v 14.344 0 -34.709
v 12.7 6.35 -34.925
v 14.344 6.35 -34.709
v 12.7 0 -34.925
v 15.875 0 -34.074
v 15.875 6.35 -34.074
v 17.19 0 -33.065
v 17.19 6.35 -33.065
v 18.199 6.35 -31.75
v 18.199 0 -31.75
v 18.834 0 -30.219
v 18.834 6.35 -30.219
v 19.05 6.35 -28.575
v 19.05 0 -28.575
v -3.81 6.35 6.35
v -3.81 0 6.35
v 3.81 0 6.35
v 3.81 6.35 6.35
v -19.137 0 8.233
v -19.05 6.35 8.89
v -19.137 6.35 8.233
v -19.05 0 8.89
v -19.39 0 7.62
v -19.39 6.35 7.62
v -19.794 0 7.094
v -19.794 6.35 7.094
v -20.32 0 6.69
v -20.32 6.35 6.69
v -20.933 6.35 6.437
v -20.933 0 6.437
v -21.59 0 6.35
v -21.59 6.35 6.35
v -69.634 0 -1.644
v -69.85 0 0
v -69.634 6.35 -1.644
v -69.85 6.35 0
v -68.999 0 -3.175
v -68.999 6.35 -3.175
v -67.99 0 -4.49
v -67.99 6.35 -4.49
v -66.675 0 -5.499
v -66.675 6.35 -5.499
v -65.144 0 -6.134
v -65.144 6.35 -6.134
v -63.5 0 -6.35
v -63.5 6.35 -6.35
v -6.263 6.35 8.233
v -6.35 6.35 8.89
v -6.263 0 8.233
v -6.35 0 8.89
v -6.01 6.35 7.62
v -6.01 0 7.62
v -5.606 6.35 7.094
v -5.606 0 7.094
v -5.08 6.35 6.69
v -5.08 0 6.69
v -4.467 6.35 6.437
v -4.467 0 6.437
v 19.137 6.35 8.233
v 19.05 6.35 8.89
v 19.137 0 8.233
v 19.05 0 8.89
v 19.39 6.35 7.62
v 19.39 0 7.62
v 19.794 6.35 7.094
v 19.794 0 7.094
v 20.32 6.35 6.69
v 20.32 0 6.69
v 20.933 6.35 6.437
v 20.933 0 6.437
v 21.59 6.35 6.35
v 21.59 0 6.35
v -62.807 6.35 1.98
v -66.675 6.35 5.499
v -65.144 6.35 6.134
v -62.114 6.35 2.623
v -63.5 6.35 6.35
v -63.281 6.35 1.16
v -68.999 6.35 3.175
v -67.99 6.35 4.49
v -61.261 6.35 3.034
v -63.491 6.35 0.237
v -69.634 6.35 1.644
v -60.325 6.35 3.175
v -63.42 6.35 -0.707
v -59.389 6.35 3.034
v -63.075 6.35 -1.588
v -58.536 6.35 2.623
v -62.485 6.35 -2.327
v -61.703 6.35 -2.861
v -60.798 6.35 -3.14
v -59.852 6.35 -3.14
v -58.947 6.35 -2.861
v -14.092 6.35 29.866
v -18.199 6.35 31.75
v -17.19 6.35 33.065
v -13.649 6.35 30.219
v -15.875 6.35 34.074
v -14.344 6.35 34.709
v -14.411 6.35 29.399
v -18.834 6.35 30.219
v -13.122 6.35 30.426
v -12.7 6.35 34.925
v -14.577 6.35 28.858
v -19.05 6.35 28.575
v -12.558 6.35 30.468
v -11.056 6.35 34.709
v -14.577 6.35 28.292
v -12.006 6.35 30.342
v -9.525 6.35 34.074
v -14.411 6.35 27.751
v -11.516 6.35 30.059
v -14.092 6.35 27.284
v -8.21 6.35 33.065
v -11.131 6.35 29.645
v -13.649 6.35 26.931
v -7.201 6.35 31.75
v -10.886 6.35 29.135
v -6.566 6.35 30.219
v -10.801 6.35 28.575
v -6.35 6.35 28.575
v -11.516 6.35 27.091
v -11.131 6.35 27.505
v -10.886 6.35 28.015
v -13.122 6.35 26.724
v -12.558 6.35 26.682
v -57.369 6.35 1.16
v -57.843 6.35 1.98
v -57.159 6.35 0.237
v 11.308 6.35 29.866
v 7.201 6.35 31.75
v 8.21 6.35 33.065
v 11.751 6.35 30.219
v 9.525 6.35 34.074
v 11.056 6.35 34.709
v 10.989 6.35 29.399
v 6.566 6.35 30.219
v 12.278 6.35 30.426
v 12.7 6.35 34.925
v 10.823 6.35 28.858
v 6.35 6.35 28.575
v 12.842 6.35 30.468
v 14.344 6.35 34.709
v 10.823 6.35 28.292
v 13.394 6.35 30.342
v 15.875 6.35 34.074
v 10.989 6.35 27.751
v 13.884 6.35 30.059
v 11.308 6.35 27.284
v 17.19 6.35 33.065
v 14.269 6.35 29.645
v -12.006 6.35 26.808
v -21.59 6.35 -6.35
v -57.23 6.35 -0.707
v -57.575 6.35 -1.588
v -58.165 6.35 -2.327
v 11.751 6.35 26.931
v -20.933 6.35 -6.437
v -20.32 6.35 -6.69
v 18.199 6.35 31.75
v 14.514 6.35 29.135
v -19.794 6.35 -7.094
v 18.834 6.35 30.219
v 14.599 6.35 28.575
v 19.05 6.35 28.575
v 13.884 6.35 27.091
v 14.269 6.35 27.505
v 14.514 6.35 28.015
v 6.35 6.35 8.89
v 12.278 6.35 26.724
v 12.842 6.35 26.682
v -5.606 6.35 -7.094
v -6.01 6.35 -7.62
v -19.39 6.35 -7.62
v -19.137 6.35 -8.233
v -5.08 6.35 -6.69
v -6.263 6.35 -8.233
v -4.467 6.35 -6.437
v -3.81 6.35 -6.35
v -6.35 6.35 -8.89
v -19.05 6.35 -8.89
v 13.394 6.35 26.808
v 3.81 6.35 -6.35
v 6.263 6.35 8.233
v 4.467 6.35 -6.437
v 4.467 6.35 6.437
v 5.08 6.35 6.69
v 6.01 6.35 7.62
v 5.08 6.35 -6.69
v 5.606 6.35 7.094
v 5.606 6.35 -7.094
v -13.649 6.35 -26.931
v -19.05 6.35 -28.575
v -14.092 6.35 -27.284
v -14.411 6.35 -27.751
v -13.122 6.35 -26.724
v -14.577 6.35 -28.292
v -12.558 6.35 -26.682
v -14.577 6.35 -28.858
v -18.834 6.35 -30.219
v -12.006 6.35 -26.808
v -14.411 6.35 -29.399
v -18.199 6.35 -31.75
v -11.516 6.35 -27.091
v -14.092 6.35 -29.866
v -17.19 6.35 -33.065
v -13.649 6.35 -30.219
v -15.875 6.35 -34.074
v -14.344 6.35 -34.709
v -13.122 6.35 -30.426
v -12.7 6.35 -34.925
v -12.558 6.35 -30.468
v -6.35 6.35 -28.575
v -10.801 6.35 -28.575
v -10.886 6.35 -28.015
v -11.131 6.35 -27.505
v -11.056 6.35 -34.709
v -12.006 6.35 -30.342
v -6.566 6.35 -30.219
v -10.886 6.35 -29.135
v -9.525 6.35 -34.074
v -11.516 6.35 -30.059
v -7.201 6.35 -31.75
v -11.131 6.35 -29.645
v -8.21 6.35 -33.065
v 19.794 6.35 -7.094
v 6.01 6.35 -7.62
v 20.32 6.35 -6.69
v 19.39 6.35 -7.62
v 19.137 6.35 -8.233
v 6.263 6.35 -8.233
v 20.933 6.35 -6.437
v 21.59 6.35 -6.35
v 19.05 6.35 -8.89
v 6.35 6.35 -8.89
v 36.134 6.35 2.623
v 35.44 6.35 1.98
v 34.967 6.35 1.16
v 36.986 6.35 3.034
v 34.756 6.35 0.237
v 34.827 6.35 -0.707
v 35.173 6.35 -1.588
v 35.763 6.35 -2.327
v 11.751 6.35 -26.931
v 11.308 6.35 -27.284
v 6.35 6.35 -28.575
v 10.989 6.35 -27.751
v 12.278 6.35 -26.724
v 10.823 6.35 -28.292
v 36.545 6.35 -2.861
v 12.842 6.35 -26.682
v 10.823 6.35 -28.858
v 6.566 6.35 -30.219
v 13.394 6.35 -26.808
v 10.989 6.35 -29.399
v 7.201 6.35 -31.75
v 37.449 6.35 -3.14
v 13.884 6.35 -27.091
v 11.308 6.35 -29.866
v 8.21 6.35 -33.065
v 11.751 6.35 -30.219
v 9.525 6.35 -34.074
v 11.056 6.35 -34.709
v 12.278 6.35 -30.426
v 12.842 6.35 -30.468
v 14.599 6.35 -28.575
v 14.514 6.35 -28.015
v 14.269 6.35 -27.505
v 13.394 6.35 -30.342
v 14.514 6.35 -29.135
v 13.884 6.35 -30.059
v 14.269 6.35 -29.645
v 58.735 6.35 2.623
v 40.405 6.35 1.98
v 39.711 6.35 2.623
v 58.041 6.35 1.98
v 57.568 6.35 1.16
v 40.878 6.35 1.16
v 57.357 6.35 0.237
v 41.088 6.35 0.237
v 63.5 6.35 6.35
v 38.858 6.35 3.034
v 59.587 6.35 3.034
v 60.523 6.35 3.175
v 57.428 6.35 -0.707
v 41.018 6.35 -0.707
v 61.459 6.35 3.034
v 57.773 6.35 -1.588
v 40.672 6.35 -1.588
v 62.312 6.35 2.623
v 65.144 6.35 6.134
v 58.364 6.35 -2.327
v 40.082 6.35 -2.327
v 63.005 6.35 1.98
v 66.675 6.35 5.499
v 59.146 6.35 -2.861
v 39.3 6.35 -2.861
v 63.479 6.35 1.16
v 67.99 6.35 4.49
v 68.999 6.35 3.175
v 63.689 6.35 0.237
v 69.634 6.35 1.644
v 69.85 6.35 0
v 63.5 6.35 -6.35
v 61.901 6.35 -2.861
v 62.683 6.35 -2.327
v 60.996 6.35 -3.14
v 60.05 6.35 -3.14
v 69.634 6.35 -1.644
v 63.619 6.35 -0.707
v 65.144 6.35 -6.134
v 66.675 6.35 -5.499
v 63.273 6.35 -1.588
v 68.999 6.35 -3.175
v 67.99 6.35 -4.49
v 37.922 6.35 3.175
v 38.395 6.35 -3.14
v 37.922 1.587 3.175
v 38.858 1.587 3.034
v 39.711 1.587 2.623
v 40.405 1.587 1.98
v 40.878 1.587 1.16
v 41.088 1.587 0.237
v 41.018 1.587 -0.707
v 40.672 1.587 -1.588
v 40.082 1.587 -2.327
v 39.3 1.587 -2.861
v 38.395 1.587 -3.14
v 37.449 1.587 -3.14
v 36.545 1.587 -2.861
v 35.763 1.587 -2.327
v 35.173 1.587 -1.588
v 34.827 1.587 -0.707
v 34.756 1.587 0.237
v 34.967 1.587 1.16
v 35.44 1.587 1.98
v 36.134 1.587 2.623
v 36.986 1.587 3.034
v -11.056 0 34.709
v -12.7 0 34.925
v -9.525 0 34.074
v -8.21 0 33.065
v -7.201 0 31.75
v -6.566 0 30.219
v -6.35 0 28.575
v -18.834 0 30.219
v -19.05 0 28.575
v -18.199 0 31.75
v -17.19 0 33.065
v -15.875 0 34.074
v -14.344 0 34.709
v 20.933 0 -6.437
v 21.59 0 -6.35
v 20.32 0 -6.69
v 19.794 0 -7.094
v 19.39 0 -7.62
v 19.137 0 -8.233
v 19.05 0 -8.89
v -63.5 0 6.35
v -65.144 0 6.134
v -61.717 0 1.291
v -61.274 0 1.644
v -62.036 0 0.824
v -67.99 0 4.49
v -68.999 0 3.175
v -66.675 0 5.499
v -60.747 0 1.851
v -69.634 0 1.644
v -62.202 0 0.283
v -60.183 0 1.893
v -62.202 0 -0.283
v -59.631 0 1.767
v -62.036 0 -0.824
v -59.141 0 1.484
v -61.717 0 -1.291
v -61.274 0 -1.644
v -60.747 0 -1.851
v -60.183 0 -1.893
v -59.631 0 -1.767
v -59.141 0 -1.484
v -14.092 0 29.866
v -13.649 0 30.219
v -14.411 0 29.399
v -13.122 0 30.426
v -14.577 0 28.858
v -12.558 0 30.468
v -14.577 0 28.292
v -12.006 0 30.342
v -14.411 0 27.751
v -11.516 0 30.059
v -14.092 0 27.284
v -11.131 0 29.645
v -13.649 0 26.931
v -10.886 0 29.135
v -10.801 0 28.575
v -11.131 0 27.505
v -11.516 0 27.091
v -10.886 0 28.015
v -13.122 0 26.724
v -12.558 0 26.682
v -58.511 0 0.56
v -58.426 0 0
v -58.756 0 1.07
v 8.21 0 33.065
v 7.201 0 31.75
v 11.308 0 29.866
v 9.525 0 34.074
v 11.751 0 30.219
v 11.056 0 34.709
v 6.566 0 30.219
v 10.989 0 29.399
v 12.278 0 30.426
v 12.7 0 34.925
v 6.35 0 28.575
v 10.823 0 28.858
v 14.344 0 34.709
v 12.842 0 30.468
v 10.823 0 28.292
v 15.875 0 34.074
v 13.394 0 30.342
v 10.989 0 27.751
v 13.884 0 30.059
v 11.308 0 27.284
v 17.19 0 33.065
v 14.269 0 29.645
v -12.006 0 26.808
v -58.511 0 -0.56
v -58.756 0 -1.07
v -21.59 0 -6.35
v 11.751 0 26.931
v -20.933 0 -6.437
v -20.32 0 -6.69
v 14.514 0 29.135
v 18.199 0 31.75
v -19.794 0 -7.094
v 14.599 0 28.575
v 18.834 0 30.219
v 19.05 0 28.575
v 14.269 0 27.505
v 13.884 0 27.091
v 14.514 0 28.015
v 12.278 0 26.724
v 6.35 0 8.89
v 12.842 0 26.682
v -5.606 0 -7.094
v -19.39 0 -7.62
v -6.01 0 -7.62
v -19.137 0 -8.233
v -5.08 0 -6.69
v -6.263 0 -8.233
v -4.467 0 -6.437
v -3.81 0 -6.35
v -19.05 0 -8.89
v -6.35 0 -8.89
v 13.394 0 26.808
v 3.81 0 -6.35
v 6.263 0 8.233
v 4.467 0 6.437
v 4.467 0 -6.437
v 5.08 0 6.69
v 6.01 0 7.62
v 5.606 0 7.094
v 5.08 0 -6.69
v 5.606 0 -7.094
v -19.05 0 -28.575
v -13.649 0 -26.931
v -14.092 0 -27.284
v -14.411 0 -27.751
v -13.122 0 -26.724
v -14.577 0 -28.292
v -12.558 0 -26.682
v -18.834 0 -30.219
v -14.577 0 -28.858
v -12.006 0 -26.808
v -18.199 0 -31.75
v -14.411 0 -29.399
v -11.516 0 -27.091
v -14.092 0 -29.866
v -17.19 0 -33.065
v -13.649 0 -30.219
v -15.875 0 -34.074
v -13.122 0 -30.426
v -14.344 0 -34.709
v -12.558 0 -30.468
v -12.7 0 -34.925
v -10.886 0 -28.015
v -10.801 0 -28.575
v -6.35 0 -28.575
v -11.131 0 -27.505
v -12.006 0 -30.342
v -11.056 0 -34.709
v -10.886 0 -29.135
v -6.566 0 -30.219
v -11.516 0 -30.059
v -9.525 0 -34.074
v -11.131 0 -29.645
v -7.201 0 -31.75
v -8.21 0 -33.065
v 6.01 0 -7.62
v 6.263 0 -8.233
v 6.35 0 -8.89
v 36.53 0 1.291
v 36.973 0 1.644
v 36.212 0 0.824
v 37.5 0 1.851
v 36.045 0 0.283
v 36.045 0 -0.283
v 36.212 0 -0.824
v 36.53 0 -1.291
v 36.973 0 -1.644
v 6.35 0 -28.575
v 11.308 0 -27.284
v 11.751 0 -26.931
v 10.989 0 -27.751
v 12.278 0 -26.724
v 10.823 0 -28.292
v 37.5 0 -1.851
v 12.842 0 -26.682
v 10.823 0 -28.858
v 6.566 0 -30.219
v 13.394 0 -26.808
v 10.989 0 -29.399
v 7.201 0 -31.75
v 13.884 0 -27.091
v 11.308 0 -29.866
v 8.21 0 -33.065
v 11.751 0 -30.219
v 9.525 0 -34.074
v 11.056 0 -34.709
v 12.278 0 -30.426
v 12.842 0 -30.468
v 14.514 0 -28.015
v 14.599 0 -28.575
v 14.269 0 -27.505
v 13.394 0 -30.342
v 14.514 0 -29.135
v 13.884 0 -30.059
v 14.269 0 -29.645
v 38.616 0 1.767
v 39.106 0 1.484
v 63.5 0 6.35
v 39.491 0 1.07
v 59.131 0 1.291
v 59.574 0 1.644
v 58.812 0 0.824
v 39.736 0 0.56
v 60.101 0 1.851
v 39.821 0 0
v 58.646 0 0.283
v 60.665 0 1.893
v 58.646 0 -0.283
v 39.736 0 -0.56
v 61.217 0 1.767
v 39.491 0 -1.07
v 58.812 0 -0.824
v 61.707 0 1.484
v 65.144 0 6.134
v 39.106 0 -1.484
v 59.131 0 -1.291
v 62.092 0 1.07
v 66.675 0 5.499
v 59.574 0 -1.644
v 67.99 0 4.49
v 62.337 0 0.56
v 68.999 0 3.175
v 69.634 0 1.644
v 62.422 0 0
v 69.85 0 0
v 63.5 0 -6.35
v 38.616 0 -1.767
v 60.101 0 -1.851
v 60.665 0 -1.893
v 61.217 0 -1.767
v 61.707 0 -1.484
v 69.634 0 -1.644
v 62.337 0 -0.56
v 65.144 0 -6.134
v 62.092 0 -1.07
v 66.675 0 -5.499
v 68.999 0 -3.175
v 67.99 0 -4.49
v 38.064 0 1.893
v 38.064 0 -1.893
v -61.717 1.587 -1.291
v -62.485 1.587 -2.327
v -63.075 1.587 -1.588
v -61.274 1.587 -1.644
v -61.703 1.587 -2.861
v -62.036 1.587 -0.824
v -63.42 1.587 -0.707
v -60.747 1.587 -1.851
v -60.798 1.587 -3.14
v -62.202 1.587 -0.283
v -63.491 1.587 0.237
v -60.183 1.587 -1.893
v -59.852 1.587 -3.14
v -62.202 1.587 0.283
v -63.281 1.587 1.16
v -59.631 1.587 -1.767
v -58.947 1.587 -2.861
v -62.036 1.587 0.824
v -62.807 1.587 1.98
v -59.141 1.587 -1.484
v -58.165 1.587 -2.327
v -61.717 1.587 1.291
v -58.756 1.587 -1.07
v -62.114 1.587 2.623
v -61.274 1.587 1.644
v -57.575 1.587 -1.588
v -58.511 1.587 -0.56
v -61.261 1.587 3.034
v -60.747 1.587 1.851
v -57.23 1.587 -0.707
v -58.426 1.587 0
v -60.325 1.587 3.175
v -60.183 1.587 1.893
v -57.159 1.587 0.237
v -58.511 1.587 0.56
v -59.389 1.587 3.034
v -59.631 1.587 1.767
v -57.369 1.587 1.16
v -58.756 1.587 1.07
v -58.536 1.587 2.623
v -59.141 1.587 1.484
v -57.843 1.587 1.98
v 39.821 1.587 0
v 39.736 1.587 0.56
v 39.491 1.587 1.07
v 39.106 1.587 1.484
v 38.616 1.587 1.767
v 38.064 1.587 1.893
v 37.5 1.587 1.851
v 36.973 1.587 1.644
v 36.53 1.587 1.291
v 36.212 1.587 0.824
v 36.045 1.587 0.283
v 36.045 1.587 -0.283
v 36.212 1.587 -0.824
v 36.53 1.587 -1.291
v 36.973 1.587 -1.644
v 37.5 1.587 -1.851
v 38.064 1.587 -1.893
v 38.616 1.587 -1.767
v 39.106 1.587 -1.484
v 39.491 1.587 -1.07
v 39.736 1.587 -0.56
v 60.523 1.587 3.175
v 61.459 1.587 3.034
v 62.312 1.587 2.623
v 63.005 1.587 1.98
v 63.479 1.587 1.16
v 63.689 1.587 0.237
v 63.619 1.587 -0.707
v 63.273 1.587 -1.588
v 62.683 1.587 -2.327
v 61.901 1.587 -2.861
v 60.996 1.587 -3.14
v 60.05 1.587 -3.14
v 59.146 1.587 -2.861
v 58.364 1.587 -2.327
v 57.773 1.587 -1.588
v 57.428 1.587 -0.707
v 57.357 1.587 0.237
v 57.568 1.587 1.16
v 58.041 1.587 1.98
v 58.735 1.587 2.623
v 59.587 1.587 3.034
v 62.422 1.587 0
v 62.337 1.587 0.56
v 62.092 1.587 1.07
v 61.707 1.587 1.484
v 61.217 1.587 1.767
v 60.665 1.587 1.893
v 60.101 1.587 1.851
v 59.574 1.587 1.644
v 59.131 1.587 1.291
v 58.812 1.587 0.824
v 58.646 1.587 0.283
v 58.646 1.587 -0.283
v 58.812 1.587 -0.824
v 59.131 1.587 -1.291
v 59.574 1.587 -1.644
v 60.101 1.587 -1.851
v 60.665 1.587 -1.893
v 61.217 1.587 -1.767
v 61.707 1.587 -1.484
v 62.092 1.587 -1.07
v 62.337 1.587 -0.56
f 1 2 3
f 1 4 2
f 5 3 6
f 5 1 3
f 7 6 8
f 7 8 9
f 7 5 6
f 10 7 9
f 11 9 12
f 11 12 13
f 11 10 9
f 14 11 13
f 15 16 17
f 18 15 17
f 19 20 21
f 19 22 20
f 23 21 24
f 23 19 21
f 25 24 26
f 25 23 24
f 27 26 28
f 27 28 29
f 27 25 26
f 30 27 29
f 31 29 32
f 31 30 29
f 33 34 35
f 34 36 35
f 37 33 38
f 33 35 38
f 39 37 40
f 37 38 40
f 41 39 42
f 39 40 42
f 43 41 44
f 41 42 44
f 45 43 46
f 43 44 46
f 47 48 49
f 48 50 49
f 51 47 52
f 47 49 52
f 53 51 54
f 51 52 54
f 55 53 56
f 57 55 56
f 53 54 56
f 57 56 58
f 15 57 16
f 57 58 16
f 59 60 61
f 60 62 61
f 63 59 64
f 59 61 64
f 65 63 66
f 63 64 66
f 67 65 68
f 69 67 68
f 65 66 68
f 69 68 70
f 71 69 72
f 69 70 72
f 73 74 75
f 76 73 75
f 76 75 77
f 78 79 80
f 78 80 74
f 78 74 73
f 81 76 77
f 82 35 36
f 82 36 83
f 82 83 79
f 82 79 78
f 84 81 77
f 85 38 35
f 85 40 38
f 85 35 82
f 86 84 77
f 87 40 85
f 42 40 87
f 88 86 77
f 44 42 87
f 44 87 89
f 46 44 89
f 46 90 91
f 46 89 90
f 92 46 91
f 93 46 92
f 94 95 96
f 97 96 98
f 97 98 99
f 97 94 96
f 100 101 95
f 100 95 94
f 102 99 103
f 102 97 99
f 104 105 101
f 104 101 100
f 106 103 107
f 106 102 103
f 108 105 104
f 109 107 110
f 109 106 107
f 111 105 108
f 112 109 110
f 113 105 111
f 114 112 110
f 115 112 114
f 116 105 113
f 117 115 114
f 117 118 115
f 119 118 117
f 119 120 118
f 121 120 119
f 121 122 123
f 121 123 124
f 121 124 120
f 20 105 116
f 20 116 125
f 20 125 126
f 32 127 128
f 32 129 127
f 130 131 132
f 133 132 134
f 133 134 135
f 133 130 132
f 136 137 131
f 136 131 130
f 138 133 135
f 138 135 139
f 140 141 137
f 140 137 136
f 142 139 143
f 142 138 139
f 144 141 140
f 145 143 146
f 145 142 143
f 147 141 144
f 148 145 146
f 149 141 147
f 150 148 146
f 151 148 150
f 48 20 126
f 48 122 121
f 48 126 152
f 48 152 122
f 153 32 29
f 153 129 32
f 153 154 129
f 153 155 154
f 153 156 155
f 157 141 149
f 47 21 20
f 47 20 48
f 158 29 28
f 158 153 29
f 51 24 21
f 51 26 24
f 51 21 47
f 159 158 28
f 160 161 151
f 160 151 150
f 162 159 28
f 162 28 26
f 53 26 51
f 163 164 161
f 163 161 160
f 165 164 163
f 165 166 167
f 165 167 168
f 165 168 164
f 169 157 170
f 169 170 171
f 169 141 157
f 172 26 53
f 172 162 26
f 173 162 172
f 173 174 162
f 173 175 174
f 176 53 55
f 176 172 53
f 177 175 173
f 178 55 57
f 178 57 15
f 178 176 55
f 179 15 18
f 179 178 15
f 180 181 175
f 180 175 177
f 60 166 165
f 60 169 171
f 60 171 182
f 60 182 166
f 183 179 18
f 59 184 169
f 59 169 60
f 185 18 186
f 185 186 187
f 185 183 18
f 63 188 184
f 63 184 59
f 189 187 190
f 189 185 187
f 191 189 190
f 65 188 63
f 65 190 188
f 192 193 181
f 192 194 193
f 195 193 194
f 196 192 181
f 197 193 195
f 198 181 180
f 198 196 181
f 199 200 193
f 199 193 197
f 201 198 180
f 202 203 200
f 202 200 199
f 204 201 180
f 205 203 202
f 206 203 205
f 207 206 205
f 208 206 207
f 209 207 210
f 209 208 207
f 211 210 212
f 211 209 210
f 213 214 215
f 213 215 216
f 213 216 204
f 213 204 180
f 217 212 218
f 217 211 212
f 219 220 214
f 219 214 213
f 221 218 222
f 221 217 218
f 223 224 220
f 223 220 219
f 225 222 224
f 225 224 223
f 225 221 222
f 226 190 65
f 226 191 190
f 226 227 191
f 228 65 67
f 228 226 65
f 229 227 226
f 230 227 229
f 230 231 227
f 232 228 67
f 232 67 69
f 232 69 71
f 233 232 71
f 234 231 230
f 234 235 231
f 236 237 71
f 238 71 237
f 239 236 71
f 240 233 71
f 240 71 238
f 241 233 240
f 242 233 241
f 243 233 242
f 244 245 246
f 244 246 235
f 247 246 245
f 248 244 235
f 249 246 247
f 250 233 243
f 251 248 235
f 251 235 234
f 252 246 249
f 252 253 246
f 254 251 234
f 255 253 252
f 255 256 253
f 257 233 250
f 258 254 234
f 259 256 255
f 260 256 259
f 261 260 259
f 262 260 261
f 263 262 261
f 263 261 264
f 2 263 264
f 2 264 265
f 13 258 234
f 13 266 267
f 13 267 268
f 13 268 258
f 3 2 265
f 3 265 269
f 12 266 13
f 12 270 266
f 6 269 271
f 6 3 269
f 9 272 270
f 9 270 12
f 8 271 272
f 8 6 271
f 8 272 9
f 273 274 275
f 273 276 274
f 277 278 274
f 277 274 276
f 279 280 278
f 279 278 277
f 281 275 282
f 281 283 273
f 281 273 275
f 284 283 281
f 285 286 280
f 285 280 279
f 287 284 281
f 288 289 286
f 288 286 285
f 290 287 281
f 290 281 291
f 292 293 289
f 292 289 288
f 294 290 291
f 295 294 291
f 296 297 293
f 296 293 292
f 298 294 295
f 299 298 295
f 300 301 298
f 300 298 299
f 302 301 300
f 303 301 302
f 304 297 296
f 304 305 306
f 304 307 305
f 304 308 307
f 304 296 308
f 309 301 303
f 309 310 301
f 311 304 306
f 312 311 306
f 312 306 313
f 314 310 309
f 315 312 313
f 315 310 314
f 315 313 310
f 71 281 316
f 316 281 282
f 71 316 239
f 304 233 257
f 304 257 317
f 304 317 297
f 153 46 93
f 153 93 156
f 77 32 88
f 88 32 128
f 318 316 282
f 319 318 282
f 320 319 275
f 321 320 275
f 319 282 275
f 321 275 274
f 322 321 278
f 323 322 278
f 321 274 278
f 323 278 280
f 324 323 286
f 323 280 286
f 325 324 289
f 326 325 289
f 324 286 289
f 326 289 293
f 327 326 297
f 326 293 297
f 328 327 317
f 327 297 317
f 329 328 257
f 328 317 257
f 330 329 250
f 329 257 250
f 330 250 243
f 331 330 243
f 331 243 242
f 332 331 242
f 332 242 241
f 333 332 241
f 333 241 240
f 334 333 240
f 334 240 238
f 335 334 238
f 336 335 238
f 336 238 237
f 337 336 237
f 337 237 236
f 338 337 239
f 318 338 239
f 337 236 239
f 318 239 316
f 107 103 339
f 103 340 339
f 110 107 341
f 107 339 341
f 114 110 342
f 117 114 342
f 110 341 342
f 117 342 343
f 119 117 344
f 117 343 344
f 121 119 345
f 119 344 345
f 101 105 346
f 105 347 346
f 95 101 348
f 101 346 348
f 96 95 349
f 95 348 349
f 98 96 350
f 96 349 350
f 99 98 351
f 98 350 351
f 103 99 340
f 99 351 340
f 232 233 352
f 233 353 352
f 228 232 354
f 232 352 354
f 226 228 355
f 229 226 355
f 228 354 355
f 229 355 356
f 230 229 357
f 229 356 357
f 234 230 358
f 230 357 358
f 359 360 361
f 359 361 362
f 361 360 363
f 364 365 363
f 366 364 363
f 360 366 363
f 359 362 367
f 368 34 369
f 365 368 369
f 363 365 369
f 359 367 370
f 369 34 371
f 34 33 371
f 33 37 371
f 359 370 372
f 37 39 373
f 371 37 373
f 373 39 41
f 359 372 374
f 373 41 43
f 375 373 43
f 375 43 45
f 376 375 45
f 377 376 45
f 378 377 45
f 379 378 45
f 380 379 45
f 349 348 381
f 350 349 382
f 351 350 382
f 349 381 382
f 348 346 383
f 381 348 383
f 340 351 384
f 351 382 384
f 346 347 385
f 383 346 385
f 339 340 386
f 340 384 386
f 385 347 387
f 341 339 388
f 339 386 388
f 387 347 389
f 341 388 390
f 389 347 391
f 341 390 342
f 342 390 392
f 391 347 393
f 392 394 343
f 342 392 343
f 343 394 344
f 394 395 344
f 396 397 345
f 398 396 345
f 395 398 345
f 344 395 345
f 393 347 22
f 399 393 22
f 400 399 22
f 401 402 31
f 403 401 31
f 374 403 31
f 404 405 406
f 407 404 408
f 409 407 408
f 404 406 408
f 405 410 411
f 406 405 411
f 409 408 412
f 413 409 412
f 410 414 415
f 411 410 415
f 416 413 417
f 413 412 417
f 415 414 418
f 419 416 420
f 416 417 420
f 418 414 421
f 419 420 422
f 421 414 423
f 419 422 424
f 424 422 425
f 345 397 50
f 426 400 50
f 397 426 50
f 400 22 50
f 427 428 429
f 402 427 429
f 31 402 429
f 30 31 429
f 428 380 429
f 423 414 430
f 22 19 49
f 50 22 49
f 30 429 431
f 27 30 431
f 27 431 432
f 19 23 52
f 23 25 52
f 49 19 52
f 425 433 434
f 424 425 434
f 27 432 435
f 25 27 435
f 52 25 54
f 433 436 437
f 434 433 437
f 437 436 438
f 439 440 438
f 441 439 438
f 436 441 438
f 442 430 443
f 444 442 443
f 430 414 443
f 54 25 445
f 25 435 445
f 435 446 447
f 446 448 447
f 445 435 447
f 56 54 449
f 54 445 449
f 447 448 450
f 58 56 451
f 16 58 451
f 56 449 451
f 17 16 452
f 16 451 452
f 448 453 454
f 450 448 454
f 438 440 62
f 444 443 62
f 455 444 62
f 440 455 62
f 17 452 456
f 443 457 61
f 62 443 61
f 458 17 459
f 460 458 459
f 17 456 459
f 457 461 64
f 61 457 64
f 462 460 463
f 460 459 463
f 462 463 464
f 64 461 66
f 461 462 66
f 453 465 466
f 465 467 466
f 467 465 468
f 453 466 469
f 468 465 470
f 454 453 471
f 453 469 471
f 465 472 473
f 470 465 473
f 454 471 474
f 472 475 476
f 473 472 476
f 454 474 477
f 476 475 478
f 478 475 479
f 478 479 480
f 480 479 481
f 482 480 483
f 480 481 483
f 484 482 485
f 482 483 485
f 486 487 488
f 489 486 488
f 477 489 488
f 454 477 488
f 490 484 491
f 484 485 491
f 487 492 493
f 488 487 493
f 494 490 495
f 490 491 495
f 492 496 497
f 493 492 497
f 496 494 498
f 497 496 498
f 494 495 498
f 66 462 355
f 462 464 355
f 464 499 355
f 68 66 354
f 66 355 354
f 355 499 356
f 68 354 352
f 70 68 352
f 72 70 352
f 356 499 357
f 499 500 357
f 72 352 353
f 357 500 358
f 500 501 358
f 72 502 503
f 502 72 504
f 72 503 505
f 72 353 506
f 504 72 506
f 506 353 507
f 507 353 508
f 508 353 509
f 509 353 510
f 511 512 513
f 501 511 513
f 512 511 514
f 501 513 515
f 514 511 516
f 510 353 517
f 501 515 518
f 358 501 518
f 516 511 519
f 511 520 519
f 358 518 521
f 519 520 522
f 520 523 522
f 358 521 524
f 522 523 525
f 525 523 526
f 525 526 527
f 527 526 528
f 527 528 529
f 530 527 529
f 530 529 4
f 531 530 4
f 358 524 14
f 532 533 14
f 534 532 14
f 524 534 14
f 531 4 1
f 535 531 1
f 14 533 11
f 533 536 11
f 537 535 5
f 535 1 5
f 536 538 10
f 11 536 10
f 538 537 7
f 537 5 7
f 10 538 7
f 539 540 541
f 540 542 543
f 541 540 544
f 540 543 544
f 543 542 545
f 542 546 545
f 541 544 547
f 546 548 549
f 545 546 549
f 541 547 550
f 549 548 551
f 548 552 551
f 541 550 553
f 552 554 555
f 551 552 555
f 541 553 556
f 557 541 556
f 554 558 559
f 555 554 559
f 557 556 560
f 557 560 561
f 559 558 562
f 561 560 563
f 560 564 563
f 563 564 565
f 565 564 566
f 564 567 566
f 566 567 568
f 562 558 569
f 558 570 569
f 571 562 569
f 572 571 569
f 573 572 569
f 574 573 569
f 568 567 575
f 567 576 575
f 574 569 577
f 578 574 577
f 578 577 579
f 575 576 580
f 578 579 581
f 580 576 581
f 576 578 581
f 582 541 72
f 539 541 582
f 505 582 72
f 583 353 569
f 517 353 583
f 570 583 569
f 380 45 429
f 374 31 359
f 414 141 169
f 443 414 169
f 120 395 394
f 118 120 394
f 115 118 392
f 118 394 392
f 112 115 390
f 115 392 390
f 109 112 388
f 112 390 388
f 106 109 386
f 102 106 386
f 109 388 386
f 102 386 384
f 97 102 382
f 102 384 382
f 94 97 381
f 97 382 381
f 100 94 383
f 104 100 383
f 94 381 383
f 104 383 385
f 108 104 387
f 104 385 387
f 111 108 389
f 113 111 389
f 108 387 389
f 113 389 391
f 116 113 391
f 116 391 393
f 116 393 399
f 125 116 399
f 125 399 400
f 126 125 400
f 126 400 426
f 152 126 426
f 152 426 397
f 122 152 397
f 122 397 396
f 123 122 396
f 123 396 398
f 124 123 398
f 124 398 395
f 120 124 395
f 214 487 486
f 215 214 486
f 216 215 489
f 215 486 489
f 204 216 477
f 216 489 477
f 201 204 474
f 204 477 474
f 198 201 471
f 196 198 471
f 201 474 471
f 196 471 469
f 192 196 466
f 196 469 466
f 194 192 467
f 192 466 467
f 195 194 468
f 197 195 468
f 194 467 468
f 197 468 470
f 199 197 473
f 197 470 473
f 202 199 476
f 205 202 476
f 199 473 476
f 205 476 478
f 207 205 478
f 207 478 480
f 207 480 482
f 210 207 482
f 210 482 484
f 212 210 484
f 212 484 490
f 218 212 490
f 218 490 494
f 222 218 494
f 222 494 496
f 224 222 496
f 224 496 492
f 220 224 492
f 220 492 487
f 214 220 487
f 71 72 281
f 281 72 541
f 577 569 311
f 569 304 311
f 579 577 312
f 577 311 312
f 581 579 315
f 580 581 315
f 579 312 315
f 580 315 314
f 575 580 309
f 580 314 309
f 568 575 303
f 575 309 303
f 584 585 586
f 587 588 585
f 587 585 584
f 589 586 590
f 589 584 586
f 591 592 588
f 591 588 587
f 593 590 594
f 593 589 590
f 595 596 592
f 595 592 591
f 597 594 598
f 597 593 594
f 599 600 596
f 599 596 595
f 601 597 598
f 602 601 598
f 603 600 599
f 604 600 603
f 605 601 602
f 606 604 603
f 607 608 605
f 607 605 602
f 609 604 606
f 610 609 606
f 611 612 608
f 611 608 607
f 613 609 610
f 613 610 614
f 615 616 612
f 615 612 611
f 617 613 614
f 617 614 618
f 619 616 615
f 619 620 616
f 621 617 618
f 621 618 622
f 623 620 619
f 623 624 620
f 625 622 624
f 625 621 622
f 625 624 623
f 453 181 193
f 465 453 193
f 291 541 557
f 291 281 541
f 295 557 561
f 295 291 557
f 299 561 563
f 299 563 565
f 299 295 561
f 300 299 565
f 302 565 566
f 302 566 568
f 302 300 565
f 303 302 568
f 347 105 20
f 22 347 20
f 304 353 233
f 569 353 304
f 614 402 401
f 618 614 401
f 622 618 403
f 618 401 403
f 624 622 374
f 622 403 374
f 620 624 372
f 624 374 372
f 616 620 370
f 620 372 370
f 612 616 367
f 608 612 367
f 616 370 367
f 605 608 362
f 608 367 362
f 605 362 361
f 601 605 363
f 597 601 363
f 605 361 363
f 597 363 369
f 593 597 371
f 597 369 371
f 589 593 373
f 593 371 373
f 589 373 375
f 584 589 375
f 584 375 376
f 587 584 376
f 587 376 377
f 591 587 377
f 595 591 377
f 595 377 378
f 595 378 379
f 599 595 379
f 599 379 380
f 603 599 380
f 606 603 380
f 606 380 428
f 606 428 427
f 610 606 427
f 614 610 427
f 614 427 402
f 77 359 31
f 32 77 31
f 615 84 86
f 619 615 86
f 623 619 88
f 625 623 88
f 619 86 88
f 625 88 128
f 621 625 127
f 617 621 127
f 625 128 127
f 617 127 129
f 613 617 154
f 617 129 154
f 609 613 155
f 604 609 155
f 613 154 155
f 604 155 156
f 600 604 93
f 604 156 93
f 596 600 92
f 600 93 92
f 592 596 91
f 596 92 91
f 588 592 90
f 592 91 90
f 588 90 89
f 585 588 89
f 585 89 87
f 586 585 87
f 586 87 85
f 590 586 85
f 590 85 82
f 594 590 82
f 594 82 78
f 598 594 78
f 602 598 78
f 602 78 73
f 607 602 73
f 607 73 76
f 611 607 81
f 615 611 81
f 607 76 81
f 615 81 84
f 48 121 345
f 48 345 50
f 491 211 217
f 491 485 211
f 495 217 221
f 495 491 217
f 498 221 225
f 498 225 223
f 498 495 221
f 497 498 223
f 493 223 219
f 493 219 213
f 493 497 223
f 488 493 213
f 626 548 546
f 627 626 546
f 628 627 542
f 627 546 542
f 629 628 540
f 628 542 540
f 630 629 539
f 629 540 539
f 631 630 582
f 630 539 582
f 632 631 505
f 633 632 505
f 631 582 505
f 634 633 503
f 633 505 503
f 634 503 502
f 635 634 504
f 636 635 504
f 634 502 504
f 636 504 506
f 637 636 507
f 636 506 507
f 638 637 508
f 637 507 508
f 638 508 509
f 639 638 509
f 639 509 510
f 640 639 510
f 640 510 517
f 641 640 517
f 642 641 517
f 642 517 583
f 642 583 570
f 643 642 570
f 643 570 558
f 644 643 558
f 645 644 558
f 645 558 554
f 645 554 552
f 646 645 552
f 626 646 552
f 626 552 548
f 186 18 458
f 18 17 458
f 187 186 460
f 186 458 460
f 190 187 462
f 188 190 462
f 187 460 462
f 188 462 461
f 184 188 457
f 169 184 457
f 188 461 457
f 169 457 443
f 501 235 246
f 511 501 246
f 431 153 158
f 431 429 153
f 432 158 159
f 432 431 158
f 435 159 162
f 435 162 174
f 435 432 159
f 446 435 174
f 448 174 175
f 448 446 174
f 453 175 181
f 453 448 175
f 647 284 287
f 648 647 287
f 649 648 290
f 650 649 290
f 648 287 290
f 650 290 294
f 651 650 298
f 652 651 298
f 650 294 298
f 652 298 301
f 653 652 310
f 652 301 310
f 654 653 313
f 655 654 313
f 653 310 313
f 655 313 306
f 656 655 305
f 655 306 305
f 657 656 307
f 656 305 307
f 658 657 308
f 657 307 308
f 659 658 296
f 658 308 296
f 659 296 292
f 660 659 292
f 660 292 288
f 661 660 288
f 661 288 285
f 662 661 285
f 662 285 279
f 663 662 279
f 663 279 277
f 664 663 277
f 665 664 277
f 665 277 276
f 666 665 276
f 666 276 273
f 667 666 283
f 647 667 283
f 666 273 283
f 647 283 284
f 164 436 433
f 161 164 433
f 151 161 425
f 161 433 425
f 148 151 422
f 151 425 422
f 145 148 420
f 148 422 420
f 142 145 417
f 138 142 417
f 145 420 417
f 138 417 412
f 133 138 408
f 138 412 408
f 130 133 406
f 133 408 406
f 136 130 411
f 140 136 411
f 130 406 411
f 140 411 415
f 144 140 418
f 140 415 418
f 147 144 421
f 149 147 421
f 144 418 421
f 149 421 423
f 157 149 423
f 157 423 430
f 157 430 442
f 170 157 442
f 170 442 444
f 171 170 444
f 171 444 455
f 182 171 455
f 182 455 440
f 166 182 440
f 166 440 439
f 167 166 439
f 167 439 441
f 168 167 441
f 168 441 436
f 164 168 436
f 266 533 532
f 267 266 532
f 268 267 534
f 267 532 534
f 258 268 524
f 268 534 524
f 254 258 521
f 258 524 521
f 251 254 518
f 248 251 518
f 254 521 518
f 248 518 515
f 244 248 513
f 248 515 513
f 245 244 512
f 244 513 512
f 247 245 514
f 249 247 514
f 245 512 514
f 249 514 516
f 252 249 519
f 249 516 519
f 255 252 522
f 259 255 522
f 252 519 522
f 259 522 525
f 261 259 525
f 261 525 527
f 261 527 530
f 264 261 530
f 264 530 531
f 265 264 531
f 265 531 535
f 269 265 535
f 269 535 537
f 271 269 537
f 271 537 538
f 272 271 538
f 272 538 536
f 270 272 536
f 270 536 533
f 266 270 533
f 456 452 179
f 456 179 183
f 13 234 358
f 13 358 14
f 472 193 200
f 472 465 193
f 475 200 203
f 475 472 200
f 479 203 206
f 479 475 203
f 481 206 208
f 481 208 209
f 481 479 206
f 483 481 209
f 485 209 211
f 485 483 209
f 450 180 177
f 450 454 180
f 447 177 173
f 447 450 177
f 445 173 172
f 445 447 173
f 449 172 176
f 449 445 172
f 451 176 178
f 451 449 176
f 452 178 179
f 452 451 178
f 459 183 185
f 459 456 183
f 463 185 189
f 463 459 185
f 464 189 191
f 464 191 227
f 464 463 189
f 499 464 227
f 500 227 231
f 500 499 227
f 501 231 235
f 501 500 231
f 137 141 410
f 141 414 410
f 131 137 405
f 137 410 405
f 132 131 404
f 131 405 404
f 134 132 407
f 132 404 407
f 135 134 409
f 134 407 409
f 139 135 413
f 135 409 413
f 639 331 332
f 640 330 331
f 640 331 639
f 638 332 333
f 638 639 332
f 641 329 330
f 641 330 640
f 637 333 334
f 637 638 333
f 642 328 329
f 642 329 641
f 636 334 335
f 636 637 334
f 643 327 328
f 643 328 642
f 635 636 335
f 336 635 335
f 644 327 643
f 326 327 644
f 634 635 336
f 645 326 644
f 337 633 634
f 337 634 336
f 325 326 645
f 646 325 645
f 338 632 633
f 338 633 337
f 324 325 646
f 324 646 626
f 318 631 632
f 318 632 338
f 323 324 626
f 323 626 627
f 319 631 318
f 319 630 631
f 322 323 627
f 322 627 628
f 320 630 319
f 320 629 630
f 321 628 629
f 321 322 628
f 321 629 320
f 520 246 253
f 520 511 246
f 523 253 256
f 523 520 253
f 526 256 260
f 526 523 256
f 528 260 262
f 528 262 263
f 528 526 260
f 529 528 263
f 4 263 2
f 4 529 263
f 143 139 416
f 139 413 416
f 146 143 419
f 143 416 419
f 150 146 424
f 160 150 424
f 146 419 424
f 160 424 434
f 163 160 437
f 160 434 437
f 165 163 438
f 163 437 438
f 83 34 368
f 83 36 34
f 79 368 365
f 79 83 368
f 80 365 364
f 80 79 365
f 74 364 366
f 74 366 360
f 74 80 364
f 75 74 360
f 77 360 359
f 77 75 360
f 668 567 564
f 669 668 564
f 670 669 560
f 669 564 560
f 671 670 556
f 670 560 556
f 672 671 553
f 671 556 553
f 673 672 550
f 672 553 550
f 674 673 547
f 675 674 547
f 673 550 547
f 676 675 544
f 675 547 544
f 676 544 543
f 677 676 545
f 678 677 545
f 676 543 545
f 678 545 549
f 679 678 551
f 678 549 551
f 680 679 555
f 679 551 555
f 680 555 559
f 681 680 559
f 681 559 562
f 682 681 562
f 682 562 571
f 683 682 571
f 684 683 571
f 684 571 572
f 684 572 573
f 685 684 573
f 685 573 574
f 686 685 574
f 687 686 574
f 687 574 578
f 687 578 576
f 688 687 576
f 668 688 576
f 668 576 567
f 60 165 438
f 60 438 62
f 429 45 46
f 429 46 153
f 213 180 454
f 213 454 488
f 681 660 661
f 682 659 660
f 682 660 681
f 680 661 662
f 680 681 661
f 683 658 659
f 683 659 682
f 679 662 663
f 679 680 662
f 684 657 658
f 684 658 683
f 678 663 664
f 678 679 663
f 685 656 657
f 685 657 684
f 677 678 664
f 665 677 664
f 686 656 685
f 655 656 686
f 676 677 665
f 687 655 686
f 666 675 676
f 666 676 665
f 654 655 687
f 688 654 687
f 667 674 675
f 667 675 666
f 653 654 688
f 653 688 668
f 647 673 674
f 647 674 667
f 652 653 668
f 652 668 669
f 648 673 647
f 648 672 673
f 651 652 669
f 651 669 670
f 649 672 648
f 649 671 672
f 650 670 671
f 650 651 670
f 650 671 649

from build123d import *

# Parameters (mm, degrees)
SKETCH1_W                 = 139.7
SKETCH1_H                 = 12.7
BOSS_EXTRUDE1_DEPTH       = 6.35
SKETCH2_R                 = 3.175
CUT_EXTRUDE2_DEPTH        = 4.7625
SKETCH3_R                 = 3.175
CUT_EXTRUDE3_DEPTH        = 4.7625
FILLET1_R                 = 6.35
F_6_CLEARANCE_HOLE1_D     = 3.7973
F_6_CLEARANCE_HOLE1_DEPTH = 25.4
F_6_CLEARANCE_HOLE1_TIP   = 1.140824014
F_6_CLEARANCE_HOLE2_D     = 3.7973
F_6_CLEARANCE_HOLE2_DEPTH = 25.4
F_6_CLEARANCE_HOLE2_TIP   = 1.140824014
SKETCH8_W                 = 12.7
SKETCH8_H                 = 69.85
BOSS_EXTRUDE2_DEPTH       = 6.35
F_6_CLEARANCE_HOLE3_D     = 3.7973
F_6_CLEARANCE_HOLE3_DEPTH = 25.4
F_6_CLEARANCE_HOLE3_TIP   = 1.140824014
FILLET2_R                 = 2.54
FILLET3_R                 = 6.35


with BuildPart() as part:
    # Sketch1 → Boss-Extrude1 (new body)
    with BuildSketch(Plane(origin=(0, 0, 0), x_dir=(1, 0, 0), z_dir=(0, 1, 0))):
        Rectangle(SKETCH1_W, SKETCH1_H)
    extrude(amount=BOSS_EXTRUDE1_DEPTH)

    # Sketch2 → Cut-Extrude2 (cut)
    with BuildSketch(Plane(origin=(0, 6.35, 0), x_dir=(1, 0, 0), z_dir=(0, 1, 0))):
        with Locations(Location((-60.325, 0, 0), (0, 0, 270))):
            Circle(SKETCH2_R)
        with Locations(Location((37.9222, 0, 0), (0, 0, 270))):
            Circle(SKETCH2_R)
        with Locations(Location((60.52312, 0, 0), (0, 0, 270))):
            Circle(SKETCH2_R)
    extrude(amount=-CUT_EXTRUDE2_DEPTH, mode=Mode.SUBTRACT)

    # Sketch3 → Cut-Extrude3 (cut)
    with BuildSketch(Plane.XZ):
        with Locations(Location((-12.7, 0, 0), (0, 0, 270))):
            Circle(SKETCH3_R)
        with Locations(Location((12.7, 0, 0), (0, 0, 270))):
            Circle(SKETCH3_R)
    extrude(amount=-CUT_EXTRUDE3_DEPTH, mode=Mode.SUBTRACT)

    # Fillet1
    fillet1_edges = [part.edges().sort_by_distance(p)[0] for p in [
        (69.85, 3.175, 6.35),
        (69.85, 3.175, -6.35),
        (-69.85, 3.175, 6.35),
        (-69.85, 3.175, -6.35),
    ]]
    fillet(fillet1_edges, radius=FILLET1_R - 0.0001)  # a hair under: the kernel refuses the full size

    # #6 Clearance Hole1
    with Locations(Plane(origin=(0, 1.5875, 0), x_dir=(-1, 0, 0), z_dir=(0, 1, 0))):
        with Locations((-60.52312, 0), (-37.9222, 0), (60.325, 0)):
            Hole(F_6_CLEARANCE_HOLE1_D / 2, depth=F_6_CLEARANCE_HOLE1_DEPTH)
            with Locations((0, 0, -(F_6_CLEARANCE_HOLE1_DEPTH + F_6_CLEARANCE_HOLE1_TIP / 2))):  # 118° drill point
                Cone(0, F_6_CLEARANCE_HOLE1_D / 2, F_6_CLEARANCE_HOLE1_TIP, mode=Mode.SUBTRACT)

    # #6 Clearance Hole2
    with Locations(Plane.XZ.offset(-4.7625)):
        with Locations((-12.7, 0), (12.7, 0)):
            Hole(F_6_CLEARANCE_HOLE2_D / 2, depth=F_6_CLEARANCE_HOLE2_DEPTH)
            with Locations((0, 0, -(F_6_CLEARANCE_HOLE2_DEPTH + F_6_CLEARANCE_HOLE2_TIP / 2))):  # 118° drill point
                Cone(0, F_6_CLEARANCE_HOLE2_D / 2, F_6_CLEARANCE_HOLE2_TIP, mode=Mode.SUBTRACT)

    # Sketch8 → Boss-Extrude2 (add)
    with BuildSketch(Plane(origin=(0, 6.35, 0), x_dir=(1, 0, 0), z_dir=(0, 1, 0))):
        with Locations((-12.7, 0)):
            Rectangle(SKETCH8_W, SKETCH8_H)
        with Locations((12.7, 0)):
            Rectangle(SKETCH8_W, SKETCH8_H)
    extrude(amount=-BOSS_EXTRUDE2_DEPTH)

    # #6 Clearance Hole3
    with Locations(Plane(origin=(0, 6.35, 0), x_dir=(-1, 0, 0), z_dir=(0, 1, 0))):
        with Locations((12.7, -28.575), (12.7, 28.575), (-12.7, 28.575), (-12.7, -28.575)):
            Hole(F_6_CLEARANCE_HOLE3_D / 2, depth=F_6_CLEARANCE_HOLE3_DEPTH)
            with Locations((0, 0, -(F_6_CLEARANCE_HOLE3_DEPTH + F_6_CLEARANCE_HOLE3_TIP / 2))):  # 118° drill point
                Cone(0, F_6_CLEARANCE_HOLE3_D / 2, F_6_CLEARANCE_HOLE3_TIP, mode=Mode.SUBTRACT)

    # Fillet2
    fillet2_edges = [part.edges().sort_by_distance(p)[0] for p in [
        (6.35, 3.175, 6.35),
        (6.35, 3.175, -6.35),
        (19.05, 3.175, 6.35),
        (19.05, 3.175, -6.35),
        (-19.05, 3.175, 6.35),
        (-19.05, 3.175, -6.35),
        (-6.35, 3.175, 6.35),
        (-6.35, 3.175, -6.35),
    ]]
    fillet(fillet2_edges, radius=FILLET2_R)

    # Fillet3
    fillet3_edges = [part.edges().sort_by_distance(p)[0] for p in [
        (19.05, 3.175, -34.925),
        (6.35, 3.175, -34.925),
        (-6.35, 3.175, -34.925),
        (-19.05, 3.175, -34.925),
        (-19.05, 3.175, 34.925),
        (-6.35, 3.175, 34.925),
        (6.35, 3.175, 34.925),
        (19.05, 3.175, 34.925),
    ]]
    fillet(fillet3_edges, radius=FILLET3_R - 0.0001)  # a hair under: the kernel refuses the full size


solid = part.part
